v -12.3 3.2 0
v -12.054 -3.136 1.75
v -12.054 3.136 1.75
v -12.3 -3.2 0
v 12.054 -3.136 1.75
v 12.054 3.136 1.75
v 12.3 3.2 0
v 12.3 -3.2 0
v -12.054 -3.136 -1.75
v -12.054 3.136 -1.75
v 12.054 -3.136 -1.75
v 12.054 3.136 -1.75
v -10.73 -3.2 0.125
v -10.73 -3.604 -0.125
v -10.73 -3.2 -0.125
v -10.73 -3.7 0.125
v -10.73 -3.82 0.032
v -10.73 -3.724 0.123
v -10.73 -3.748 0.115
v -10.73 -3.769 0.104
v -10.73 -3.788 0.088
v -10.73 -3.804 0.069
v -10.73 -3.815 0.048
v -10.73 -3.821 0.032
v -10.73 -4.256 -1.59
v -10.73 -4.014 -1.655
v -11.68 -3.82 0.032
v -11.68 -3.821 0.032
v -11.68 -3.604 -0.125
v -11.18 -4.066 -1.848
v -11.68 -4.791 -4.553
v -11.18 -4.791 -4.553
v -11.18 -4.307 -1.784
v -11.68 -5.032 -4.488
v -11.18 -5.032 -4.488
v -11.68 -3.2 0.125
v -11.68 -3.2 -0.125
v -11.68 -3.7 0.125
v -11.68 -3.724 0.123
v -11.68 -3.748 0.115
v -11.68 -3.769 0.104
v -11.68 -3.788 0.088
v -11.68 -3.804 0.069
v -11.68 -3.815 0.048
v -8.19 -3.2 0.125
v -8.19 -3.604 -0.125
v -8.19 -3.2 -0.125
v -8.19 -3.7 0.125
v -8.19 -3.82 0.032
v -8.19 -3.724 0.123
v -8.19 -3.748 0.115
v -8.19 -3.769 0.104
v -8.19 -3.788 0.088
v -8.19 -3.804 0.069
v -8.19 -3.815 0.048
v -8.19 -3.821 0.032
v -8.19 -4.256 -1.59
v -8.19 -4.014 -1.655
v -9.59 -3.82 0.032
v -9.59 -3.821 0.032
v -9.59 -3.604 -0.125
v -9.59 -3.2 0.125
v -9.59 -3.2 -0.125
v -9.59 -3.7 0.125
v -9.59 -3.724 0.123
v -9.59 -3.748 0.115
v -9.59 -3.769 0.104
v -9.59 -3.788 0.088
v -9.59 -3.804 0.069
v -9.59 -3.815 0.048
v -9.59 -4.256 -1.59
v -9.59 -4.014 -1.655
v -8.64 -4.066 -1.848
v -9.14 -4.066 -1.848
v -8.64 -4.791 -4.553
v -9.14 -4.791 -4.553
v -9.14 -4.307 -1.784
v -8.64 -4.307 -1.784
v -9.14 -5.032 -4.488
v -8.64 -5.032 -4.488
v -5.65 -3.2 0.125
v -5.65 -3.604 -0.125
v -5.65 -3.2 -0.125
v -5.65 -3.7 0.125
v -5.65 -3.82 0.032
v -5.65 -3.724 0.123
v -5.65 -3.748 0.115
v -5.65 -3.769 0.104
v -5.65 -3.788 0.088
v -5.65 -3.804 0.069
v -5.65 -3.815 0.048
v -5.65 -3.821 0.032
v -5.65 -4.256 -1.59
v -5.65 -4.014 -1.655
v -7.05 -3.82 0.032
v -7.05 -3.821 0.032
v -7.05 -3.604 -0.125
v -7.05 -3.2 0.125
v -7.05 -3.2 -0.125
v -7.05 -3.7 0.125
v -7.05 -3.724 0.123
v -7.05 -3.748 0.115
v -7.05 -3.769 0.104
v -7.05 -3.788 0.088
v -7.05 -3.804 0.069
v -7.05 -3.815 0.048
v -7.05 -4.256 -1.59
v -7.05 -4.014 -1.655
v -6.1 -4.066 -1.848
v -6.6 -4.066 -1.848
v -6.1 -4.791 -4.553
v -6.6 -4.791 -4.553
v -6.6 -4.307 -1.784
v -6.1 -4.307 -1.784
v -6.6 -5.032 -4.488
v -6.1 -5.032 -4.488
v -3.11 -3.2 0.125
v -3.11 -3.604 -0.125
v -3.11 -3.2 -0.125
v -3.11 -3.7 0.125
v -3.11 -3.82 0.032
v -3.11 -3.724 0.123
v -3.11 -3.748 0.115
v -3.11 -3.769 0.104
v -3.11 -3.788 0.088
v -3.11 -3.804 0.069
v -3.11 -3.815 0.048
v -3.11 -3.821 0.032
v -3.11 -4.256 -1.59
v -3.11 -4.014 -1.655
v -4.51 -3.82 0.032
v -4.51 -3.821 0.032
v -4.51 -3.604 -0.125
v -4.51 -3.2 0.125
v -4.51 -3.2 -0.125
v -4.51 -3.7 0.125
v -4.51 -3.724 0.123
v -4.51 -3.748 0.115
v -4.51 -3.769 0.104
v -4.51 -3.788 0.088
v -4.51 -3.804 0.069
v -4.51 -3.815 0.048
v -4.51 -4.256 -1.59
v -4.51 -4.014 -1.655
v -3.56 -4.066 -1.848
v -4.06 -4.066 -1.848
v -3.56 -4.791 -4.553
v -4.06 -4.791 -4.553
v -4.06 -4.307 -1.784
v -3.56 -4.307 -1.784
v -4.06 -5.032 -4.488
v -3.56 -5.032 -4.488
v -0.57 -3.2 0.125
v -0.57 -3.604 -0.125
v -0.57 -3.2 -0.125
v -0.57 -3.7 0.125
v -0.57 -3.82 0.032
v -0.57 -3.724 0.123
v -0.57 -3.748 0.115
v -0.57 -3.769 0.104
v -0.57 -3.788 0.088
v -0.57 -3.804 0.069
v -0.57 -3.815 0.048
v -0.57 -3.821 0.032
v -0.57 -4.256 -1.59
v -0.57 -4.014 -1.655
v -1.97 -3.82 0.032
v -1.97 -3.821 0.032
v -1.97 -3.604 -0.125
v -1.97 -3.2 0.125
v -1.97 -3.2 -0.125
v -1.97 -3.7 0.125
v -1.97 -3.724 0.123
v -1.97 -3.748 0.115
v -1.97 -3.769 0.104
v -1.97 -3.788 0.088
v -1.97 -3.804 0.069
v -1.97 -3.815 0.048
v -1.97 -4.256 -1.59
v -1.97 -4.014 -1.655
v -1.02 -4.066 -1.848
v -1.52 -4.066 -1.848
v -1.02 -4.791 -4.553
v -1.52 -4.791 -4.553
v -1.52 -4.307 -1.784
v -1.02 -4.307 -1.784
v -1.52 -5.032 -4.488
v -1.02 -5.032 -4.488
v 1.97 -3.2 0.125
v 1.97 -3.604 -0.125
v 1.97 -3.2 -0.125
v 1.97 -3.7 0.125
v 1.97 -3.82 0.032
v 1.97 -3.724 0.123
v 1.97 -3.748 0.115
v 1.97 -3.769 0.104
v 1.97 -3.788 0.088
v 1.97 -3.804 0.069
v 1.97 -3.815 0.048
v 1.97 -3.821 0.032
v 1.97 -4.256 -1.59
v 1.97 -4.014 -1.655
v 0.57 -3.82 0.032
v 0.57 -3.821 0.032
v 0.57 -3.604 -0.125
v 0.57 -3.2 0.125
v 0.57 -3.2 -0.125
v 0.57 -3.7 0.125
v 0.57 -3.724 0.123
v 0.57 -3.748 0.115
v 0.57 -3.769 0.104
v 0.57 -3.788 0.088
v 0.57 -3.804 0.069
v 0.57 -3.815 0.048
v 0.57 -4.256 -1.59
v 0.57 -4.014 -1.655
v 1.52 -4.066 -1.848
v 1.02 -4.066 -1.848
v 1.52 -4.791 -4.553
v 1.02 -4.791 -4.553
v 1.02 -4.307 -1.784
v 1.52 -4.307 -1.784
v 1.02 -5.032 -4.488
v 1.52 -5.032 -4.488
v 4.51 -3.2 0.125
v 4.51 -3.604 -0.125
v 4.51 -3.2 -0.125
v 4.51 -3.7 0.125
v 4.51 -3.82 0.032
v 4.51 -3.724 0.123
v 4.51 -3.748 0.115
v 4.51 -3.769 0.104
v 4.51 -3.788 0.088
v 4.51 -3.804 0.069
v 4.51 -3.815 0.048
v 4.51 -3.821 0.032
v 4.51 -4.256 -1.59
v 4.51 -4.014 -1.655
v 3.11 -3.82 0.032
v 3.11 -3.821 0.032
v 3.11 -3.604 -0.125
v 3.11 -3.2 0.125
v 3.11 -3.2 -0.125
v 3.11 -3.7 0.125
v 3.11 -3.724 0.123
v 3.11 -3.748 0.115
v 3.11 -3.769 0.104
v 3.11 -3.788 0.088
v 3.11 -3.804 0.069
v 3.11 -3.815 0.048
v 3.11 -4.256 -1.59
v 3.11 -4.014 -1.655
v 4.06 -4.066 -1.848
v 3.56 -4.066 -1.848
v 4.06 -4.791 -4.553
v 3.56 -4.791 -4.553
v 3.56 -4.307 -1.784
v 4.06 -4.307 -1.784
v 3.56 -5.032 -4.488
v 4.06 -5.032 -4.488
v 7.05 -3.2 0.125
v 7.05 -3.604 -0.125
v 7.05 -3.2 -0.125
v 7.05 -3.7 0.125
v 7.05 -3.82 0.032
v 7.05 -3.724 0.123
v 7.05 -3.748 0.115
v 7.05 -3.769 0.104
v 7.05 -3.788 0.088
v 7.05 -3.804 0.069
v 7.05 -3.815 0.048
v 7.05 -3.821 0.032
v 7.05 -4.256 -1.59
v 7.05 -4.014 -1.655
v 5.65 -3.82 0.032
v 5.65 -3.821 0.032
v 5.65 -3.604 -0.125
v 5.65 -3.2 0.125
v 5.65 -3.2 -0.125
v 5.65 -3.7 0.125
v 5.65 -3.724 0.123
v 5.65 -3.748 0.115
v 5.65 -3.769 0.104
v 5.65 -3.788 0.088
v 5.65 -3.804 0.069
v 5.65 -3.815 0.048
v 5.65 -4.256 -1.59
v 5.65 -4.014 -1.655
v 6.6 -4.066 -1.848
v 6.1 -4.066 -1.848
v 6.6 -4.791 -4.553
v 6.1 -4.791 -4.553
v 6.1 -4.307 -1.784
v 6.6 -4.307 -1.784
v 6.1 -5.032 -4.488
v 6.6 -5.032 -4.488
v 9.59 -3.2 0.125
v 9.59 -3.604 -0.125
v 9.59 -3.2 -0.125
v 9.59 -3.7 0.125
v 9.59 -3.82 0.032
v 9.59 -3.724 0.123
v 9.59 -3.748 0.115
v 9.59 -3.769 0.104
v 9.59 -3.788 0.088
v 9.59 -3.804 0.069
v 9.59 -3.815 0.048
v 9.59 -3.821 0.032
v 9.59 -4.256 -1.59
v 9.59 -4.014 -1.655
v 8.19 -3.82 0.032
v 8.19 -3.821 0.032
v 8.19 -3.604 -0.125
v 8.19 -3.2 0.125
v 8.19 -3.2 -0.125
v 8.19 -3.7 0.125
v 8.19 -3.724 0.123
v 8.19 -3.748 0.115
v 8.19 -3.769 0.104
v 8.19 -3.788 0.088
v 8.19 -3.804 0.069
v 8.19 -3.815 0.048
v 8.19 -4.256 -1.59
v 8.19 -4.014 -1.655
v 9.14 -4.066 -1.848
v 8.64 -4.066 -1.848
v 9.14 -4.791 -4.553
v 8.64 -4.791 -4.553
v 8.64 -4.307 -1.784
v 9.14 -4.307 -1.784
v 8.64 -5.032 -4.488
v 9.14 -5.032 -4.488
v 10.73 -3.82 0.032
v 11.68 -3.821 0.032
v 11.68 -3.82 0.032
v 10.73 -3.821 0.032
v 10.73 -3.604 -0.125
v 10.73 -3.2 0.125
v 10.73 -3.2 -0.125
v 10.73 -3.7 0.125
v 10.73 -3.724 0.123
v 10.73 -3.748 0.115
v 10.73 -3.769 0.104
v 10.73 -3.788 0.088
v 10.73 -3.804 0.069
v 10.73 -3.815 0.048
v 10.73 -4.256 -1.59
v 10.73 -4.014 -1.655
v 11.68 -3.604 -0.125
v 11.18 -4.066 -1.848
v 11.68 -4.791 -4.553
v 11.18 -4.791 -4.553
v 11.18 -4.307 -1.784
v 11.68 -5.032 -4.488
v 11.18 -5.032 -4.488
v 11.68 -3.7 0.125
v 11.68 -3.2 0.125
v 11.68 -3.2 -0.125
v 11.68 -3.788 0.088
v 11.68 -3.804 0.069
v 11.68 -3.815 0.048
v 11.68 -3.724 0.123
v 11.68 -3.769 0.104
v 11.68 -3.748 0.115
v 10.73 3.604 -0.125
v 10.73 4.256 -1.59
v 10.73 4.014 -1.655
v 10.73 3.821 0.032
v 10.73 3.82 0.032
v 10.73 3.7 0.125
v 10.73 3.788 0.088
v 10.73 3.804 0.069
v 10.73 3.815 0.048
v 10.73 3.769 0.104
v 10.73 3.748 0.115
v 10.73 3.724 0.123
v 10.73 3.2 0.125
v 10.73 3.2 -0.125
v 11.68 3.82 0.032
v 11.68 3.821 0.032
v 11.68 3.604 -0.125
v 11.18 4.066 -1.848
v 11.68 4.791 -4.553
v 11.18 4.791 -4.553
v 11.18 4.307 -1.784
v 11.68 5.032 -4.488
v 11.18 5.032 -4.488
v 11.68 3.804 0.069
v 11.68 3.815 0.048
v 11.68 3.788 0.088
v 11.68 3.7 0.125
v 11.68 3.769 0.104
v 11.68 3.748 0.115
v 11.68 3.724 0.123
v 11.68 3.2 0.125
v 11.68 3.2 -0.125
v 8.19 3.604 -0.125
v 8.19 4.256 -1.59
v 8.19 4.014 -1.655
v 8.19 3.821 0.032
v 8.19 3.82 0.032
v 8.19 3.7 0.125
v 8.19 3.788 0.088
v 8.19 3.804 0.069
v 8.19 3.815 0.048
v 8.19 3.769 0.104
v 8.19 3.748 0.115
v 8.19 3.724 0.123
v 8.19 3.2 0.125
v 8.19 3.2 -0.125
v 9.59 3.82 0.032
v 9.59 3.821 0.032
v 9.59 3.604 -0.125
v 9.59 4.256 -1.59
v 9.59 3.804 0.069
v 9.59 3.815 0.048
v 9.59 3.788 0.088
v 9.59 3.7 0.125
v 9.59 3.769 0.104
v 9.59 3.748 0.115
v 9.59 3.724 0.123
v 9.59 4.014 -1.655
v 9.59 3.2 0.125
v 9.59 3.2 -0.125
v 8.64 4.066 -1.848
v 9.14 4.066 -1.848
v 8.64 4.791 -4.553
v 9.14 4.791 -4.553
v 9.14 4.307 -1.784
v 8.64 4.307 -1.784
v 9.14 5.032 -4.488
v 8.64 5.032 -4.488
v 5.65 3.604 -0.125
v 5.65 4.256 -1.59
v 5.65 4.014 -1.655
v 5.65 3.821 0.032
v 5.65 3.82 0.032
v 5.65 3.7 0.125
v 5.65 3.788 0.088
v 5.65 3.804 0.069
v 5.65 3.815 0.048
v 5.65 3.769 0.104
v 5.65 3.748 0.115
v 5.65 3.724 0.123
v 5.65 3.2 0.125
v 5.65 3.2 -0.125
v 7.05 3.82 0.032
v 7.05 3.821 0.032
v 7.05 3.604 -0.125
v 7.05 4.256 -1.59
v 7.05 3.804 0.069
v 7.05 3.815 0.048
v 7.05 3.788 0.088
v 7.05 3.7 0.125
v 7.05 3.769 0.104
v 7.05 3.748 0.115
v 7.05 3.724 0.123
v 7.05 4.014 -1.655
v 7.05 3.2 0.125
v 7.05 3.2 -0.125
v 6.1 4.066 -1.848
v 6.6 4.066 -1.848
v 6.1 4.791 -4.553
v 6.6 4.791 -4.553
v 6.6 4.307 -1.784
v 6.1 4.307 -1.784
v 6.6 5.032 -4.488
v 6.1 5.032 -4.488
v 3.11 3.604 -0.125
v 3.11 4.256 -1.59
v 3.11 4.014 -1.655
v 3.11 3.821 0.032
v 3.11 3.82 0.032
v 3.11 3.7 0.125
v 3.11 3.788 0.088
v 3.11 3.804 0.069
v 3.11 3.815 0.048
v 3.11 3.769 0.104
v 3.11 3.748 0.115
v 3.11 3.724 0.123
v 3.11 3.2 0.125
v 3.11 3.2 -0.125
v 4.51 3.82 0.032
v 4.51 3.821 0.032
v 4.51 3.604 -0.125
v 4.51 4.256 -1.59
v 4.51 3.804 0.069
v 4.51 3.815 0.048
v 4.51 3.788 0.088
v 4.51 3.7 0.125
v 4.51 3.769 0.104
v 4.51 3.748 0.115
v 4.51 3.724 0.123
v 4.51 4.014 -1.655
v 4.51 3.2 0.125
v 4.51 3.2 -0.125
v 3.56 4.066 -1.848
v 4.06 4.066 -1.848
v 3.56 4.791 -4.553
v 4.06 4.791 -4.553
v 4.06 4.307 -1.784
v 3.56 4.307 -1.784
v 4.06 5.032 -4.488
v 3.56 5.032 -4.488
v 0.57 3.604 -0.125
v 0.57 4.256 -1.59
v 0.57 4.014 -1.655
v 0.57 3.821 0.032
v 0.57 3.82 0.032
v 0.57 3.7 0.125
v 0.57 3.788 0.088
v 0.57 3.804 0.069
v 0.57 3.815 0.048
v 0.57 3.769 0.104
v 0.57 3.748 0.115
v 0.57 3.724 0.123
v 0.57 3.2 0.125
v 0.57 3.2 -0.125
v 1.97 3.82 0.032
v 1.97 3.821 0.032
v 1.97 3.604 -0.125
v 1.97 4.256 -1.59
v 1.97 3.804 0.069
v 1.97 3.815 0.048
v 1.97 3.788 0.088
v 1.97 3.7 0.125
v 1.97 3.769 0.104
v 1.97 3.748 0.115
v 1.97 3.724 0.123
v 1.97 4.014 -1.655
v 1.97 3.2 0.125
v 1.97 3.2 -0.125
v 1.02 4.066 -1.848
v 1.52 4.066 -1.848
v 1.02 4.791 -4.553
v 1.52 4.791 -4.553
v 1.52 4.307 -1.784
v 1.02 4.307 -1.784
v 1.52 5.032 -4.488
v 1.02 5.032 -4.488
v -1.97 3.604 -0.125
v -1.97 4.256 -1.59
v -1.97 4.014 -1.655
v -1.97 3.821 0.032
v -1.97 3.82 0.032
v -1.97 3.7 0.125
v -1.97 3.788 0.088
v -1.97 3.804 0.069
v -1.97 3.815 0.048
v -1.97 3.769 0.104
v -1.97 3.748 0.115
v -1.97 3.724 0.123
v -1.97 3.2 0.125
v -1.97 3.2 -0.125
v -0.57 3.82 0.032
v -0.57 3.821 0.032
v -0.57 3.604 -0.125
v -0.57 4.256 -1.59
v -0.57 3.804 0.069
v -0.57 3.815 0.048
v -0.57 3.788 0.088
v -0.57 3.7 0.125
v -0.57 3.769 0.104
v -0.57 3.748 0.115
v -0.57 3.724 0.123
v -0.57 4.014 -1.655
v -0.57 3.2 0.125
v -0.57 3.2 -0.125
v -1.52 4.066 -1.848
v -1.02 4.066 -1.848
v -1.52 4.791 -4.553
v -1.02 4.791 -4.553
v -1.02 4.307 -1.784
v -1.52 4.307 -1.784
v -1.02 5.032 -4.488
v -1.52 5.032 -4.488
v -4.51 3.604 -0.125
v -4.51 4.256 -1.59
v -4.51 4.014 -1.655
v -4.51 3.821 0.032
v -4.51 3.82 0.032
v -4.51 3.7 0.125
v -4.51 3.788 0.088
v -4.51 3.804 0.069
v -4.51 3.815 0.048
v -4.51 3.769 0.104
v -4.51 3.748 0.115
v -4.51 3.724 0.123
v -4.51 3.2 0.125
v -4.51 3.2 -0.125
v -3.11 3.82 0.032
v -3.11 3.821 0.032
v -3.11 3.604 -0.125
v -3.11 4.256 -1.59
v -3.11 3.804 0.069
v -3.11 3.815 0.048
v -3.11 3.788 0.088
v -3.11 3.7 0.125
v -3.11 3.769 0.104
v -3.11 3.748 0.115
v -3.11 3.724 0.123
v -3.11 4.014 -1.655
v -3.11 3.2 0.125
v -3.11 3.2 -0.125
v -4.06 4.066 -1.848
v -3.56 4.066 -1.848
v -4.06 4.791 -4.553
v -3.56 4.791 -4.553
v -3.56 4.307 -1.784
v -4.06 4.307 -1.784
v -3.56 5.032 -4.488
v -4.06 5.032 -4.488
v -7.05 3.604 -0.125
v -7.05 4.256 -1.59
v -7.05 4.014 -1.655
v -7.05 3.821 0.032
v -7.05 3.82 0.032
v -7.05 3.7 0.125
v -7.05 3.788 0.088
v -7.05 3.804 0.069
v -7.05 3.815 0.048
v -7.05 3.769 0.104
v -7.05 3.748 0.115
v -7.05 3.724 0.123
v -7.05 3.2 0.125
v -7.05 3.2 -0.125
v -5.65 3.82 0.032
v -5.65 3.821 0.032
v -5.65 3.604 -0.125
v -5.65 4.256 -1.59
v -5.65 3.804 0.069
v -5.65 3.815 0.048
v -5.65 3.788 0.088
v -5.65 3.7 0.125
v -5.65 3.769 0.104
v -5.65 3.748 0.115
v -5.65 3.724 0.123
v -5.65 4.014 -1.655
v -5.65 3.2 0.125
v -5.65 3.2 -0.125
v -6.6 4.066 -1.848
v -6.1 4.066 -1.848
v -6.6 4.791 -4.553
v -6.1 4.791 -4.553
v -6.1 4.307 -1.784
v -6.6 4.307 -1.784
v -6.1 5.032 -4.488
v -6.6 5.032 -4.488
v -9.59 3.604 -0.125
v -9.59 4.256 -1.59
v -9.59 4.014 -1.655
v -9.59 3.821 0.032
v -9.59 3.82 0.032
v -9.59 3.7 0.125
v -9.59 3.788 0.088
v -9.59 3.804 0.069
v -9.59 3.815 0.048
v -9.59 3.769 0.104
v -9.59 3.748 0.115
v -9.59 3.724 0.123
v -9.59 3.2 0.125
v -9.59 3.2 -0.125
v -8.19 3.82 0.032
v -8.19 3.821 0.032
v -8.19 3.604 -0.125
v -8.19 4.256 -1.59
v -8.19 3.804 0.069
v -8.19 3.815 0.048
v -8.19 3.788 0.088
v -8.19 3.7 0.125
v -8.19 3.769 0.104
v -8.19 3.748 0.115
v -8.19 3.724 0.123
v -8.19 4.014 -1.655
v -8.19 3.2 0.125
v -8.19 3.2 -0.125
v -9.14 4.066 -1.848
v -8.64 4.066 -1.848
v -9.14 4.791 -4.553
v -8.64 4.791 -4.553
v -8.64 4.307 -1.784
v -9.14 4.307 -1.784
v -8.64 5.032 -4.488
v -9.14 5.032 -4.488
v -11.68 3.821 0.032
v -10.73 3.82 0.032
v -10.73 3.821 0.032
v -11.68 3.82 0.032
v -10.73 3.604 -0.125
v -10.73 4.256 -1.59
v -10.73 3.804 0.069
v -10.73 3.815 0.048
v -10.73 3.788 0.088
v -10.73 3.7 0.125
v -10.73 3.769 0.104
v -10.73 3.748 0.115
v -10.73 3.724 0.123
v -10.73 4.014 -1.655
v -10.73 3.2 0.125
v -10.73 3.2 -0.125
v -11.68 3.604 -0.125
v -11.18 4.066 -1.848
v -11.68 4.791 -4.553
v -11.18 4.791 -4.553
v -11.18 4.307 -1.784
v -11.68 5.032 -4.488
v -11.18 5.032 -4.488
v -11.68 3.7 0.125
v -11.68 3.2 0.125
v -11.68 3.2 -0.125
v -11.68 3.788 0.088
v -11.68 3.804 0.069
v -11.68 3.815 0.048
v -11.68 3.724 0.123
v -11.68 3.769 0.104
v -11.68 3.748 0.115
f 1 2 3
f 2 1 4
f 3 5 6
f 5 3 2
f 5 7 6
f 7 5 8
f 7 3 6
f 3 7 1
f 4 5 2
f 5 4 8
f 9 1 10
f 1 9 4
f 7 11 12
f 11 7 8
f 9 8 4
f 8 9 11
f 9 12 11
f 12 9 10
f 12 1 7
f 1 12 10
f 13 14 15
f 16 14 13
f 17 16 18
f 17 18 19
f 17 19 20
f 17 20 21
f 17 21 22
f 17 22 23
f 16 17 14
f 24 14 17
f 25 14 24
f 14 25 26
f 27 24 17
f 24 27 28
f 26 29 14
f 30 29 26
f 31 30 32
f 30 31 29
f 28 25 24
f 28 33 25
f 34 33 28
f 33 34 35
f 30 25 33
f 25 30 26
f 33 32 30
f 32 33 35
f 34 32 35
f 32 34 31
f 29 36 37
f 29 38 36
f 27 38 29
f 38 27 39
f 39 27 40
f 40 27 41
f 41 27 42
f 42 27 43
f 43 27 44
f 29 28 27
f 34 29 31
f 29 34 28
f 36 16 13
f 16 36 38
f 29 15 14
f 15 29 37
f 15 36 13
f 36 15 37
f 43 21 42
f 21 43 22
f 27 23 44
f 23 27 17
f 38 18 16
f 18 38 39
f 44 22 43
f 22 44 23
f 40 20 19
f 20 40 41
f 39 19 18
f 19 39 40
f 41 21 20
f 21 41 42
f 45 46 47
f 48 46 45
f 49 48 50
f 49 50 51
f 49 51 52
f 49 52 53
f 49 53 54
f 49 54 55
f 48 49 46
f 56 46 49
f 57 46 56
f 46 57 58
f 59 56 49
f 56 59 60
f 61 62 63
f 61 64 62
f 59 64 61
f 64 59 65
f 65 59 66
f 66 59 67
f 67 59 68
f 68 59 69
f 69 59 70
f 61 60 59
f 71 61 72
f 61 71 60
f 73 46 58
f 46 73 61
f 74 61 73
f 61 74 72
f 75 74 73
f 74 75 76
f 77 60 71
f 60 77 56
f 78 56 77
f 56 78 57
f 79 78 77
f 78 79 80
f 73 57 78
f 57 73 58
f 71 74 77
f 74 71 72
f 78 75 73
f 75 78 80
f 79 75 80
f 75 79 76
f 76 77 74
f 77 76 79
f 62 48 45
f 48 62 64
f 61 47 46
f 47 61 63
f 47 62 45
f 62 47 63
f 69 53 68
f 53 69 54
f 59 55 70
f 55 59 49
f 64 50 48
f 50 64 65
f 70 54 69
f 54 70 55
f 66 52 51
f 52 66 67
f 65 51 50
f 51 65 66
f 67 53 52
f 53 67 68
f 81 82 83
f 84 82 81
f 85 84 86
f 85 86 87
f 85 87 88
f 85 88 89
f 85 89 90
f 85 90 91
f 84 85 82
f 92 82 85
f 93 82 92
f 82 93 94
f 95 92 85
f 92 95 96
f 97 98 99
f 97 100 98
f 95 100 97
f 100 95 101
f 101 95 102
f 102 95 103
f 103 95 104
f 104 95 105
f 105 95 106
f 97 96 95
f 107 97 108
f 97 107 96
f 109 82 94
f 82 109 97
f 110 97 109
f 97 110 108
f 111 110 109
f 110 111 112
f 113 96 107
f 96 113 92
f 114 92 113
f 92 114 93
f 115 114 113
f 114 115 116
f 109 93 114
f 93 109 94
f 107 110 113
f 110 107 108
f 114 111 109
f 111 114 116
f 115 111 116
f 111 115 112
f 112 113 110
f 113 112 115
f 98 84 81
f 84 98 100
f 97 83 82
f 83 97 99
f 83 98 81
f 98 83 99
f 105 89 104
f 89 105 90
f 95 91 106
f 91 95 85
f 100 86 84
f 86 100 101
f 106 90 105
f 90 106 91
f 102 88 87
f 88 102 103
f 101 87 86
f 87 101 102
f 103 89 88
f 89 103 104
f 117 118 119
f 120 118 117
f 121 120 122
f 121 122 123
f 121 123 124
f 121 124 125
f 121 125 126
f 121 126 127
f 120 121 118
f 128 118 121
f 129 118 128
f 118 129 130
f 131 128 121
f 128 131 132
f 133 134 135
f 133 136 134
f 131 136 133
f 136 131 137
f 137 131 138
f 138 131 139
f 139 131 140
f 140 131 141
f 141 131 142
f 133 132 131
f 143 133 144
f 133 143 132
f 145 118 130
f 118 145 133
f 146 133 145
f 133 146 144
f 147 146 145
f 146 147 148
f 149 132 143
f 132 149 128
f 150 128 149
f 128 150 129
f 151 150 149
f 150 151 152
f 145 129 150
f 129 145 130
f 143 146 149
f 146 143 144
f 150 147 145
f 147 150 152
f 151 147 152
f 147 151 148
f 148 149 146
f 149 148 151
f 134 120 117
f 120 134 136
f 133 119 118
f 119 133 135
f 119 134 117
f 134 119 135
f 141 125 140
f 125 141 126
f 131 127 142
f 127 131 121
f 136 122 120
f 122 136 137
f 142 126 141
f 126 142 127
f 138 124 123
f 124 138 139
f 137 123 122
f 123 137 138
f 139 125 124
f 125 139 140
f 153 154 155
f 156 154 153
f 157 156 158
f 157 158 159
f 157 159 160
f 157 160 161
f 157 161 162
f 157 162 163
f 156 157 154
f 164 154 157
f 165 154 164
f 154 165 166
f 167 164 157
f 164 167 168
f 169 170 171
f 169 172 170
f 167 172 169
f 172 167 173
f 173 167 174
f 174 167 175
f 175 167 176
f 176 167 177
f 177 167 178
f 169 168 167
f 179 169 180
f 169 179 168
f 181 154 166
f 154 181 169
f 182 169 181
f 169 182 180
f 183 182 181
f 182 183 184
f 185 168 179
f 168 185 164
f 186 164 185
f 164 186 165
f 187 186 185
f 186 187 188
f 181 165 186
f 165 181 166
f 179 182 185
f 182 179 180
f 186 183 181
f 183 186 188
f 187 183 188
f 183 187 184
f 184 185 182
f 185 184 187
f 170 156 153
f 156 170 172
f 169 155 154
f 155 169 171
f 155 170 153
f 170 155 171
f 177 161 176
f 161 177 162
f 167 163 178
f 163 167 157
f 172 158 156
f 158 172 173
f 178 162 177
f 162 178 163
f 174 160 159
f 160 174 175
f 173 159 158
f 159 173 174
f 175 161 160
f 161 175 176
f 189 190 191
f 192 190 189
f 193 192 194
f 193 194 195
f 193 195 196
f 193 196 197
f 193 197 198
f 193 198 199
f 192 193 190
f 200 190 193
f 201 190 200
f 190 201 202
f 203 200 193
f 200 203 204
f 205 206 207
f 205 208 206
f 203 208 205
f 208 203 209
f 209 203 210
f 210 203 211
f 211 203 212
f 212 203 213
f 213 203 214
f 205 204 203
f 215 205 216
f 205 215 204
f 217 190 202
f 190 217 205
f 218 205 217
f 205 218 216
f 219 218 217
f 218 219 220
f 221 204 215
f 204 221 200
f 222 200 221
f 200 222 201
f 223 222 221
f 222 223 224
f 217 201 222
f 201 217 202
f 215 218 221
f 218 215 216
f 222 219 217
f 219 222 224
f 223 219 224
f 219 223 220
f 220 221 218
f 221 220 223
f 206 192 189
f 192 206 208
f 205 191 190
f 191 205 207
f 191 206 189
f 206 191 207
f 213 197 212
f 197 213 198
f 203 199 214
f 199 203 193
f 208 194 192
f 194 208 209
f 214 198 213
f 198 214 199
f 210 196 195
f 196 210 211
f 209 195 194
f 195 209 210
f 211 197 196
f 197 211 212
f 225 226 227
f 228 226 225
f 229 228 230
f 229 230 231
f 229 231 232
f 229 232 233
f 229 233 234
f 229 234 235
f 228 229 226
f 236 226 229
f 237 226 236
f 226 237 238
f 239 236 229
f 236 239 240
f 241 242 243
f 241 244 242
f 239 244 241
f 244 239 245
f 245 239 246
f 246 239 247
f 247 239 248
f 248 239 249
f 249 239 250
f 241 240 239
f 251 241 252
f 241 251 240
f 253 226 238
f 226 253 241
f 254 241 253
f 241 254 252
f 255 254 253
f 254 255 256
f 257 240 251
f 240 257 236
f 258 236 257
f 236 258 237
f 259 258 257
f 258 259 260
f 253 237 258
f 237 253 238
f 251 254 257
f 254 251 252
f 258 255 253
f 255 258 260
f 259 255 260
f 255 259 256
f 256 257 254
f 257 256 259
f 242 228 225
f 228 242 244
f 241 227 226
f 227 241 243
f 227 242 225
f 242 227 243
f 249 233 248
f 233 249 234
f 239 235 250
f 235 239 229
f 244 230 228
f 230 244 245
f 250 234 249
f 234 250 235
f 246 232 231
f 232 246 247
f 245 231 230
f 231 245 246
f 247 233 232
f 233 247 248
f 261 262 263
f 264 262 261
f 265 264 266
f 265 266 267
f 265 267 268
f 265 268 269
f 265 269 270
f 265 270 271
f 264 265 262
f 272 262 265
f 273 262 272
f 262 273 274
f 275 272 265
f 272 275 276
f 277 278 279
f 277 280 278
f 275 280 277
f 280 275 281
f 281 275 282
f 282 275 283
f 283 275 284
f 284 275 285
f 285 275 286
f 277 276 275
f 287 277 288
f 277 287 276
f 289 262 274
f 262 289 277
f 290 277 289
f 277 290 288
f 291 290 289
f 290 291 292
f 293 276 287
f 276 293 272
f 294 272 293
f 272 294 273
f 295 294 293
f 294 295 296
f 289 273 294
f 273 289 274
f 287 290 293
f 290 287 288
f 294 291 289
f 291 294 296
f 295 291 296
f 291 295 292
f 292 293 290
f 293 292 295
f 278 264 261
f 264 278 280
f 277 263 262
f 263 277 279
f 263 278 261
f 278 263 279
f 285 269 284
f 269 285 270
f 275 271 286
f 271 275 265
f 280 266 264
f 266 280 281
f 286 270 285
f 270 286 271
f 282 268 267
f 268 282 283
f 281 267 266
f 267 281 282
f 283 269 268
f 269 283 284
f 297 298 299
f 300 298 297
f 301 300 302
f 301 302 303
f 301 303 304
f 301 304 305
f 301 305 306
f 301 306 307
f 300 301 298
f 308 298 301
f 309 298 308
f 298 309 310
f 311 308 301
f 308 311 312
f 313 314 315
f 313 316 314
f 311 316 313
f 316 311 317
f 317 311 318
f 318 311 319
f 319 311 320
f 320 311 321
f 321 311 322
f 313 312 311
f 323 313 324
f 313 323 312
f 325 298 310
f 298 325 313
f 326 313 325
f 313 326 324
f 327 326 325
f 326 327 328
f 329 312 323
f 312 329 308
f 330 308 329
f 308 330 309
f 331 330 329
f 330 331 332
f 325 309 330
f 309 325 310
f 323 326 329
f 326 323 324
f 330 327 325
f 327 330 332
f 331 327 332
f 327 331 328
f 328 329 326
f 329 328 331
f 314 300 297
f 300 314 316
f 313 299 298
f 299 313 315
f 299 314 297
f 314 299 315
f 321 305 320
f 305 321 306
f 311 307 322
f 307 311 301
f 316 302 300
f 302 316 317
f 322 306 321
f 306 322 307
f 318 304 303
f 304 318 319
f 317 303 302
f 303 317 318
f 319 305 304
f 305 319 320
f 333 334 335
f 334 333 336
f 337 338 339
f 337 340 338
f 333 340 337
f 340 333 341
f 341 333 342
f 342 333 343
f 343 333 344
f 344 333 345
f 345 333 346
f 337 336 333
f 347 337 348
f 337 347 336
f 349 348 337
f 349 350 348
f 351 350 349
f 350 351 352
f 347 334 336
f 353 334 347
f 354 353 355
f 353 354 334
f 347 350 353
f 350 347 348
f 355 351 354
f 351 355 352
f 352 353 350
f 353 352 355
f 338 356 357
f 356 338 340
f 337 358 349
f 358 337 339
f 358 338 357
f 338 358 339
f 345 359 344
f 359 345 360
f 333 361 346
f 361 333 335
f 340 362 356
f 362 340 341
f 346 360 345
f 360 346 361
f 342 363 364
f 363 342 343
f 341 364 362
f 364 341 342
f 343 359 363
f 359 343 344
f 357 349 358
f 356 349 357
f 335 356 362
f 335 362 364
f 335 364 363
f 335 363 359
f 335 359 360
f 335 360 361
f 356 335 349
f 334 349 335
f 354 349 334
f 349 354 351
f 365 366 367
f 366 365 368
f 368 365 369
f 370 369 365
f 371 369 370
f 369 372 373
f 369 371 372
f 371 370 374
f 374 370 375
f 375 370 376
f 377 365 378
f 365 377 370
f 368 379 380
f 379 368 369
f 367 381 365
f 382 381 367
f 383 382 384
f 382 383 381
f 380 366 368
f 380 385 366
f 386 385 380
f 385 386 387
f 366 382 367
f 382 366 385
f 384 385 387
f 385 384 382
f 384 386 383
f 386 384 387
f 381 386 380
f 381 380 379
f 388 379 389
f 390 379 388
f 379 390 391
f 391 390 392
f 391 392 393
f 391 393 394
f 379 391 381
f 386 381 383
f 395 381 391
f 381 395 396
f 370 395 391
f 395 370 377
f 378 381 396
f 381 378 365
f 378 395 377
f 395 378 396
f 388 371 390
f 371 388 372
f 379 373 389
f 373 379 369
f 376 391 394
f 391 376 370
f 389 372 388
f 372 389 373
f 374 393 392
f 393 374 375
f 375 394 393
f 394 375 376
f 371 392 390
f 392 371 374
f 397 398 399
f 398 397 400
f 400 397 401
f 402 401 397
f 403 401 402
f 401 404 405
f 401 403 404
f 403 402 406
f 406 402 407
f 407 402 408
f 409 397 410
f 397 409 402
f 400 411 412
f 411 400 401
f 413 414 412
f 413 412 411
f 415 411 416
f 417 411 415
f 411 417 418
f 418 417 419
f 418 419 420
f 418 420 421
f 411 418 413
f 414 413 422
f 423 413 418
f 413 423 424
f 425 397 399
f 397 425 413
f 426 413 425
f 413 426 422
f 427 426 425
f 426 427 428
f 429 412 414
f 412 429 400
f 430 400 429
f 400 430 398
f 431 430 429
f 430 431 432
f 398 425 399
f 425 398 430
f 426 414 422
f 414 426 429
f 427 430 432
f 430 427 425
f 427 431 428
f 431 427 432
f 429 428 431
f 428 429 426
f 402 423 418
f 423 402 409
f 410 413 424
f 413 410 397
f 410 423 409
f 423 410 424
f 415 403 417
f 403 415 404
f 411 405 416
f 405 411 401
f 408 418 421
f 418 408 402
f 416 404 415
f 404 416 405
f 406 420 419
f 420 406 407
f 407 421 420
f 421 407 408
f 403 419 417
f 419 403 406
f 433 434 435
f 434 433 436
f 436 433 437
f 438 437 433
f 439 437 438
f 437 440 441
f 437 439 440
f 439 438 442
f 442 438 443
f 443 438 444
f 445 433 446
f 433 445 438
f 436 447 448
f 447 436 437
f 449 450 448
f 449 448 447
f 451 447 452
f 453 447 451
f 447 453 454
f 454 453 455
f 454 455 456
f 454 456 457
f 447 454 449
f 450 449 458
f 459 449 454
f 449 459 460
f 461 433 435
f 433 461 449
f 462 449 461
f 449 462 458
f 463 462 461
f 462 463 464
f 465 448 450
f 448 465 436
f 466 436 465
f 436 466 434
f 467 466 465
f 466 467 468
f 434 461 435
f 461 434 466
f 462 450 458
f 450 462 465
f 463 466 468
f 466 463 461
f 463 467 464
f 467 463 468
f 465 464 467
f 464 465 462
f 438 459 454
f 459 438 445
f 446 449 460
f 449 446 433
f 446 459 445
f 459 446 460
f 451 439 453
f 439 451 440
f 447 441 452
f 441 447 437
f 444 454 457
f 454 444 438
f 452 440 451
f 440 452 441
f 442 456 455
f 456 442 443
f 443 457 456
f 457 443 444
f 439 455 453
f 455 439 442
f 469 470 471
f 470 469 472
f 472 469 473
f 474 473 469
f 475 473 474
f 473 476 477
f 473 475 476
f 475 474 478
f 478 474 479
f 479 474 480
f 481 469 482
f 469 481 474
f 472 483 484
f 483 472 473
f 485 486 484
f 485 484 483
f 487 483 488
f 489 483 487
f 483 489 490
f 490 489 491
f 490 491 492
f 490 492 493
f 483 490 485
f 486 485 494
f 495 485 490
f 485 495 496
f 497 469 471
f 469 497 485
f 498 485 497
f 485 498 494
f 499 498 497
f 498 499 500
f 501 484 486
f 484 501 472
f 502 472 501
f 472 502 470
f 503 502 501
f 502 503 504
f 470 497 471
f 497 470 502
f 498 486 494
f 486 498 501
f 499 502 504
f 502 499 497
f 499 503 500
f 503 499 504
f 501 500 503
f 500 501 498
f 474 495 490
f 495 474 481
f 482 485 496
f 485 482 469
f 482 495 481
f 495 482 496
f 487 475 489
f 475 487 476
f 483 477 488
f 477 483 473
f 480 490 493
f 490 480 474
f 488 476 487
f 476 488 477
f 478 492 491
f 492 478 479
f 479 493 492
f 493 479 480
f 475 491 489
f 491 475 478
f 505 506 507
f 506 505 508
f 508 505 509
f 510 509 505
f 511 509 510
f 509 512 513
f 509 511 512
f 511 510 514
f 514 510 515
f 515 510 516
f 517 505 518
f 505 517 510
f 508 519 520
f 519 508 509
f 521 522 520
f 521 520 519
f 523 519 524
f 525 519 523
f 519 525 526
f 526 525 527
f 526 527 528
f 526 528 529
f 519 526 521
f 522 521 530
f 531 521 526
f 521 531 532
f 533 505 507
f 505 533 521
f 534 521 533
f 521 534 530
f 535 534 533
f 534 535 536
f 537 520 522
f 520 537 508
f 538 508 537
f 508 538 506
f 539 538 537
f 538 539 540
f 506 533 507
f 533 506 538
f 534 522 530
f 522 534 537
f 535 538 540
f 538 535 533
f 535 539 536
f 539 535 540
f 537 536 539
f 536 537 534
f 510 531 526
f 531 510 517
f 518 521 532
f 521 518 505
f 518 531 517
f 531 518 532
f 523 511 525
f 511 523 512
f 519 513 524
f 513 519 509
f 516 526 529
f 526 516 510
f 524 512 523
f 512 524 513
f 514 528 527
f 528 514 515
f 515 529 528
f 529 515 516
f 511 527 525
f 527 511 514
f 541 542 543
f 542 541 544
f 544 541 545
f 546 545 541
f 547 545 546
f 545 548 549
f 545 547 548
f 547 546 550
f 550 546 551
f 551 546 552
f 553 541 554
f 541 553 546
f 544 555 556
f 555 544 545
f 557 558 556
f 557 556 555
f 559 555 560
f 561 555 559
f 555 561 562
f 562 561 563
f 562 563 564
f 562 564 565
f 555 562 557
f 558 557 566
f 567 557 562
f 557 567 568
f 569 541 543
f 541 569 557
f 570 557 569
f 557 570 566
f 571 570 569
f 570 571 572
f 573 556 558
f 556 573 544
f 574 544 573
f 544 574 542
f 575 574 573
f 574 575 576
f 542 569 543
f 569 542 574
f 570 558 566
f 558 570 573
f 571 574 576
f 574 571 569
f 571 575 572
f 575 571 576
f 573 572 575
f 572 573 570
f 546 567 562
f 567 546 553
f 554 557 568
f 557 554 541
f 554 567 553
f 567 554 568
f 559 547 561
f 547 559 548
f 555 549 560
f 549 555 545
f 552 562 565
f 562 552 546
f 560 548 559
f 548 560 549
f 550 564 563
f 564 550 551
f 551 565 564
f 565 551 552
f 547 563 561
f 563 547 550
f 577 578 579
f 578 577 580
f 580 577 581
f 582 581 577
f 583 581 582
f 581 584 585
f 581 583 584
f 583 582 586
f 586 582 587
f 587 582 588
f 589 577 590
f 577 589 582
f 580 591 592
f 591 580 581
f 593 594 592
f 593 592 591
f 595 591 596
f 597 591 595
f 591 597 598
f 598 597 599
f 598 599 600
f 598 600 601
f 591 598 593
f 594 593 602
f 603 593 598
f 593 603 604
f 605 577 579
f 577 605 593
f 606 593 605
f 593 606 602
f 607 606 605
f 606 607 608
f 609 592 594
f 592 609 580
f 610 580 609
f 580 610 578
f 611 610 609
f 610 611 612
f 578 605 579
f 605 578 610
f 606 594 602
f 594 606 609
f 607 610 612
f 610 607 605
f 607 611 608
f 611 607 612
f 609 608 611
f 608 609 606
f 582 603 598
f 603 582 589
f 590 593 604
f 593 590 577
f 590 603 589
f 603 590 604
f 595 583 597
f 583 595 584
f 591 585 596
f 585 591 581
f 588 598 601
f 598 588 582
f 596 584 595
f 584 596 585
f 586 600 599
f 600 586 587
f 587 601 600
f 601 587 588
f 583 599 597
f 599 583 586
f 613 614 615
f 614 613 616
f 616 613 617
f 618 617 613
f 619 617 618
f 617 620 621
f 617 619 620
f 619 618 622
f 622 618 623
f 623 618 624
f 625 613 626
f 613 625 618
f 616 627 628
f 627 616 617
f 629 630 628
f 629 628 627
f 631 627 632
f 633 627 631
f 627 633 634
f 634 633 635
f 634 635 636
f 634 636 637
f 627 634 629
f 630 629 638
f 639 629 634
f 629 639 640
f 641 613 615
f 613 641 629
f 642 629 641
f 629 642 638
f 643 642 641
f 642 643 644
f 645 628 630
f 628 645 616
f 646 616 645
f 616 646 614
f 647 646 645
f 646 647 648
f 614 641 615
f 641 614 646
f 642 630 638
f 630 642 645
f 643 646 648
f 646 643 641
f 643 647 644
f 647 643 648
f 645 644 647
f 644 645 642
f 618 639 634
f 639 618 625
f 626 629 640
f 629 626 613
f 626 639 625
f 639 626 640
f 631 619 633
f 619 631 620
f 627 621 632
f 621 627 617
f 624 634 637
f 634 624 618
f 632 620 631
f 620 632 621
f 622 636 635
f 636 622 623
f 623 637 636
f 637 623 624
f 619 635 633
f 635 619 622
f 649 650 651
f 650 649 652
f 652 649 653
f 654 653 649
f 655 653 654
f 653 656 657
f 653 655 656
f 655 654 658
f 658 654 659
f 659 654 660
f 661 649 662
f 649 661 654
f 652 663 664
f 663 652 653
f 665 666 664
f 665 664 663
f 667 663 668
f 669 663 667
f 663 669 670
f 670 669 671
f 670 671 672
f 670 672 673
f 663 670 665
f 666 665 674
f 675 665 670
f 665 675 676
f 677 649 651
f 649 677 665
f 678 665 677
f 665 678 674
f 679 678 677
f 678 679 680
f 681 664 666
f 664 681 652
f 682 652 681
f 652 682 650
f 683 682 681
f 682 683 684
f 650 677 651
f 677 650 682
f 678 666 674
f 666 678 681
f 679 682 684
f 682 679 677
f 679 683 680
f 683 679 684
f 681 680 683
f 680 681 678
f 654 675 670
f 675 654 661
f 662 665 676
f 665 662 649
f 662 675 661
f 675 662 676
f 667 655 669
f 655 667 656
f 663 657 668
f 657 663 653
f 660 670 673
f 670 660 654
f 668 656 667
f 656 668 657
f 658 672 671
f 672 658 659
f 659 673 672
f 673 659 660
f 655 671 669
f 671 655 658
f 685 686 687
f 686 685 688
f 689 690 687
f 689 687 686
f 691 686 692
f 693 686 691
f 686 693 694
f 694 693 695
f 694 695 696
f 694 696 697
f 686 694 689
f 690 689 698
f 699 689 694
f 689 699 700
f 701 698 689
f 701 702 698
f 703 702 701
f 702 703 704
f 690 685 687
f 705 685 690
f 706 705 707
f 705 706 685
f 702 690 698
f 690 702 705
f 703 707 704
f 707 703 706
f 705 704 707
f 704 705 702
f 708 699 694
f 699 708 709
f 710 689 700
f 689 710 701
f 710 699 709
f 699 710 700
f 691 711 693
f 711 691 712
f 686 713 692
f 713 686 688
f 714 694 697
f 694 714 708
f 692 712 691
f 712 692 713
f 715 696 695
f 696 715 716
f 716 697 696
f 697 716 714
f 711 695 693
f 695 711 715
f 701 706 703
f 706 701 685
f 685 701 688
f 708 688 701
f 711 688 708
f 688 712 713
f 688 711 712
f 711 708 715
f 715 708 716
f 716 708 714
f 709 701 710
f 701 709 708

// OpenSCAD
/*

Mostly accurate for 20 pins or less for most IC models.
This tool has cust first and last pin shaving off a bit of the tab,
as that was like the reference I had, not all manf. do this.

The loft angle for the IC package is determined not by the dimenions of the top of the package
but by a const 98% scale burried in the code, this is accurate enough for 8-14 pin
packages to "look good" but creates a lofted angle that is extreme for large packages
like the 64 pin 68000

I also don't cut out a notch or a have a pin 1 identifier, I was happy enough for this..

The license is WTFPL - http://www.wtfpl.net/

PLEASE use this, lol I don't know why I created it... I was just noodling around
it'd be cool if you dropped me a line telling me you used it or passed along some
merges, but not required... have fun.


        DO WHAT THE FUCK YOU WANT TO PUBLIC LICENSE 
                    Version 2, December 2004 

 Copyright (C) 2004 Sam Hocevar <sam@hocevar.net> 

 Everyone is permitted to copy and distribute verbatim or modified 
 copies of this license document, and changing it is allowed as long 
 as the name is changed. 

            DO WHAT THE FUCK YOU WANT TO PUBLIC LICENSE 
   TERMS AND CONDITIONS FOR COPYING, DISTRIBUTION AND MODIFICATION 

  0. You just DO WHAT THE FUCK YOU WANT TO.
*/

module ic() {
  ic_body_thickness = 3.5;
  ic_body_width = 6.4;

  pin_count = 20;
  pin_spacing = 2.54;

  pin_ofs = 0.87;

  leg_angle = 15;

  leg_offset_from_body = 0.5;

  ic_body_length = pin_ofs + pin_ofs + (pin_spacing * (pin_count/2-1));

  // leg thickness
  thickness = 0.25;
  
  // width of portion coming from the body
  upper_width = thickness*5.6;
  // width of through hole pin portion
  lower_width = thickness*2;

  lower_length_top = upper_width * 1.2;  
  lower_length = 3.0;
  
  module ic_body_half() {
    linear_extrude(height=ic_body_thickness/2, scale=0.98) {
      square(size=[ic_body_length, ic_body_width], center=true);
    }
  }

  module ic_body() {
    union() {
      ic_body_half();  // First half
      rotate([180, 0, 0]) ic_body_half();  // Second half flipped and positioned
    }
  }

  module ic_leg() {
    scale_factor = lower_width / upper_width;
    // Base section (Box)
    translate([0, -leg_offset_from_body/2, 0]) {
      cube([upper_width, leg_offset_from_body, thickness], center=true);
    }

    // Cylinder (Bend)
    translate([0, -leg_offset_from_body, 0]) {
      rotate([0, 90, 0]) { // Rotating to align along the Y-axis
        cylinder(h=upper_width, r=thickness/2, center=true, $fn=32);
      }
    }

    translate([0, -leg_offset_from_body, 0])  {
      rotate([-leg_angle,0,0]) {
        translate([0, 0, -lower_length_top/2])  {
          cube([upper_width, thickness, lower_length_top], center=true);
        }

        translate([0, 0, -lower_length_top])  {
          rotate([0,180,0]) {
            linear_extrude(height = .2, scale = [scale_factor, 1]) {
              square([upper_width, thickness], center = true);
            }
          }
        }

        translate([0,0, -lower_length_top-lower_length/2]) {
          cube([lower_width, thickness, lower_length], center= true);
        }
      }
    }
  }

  module leg_array() {
    difference() {
      union() {
        for (i = [0 : pin_count/2-1]) {
          translate([i * pin_spacing, 0, 0])
          ic_leg();
        }
      }
      translate([-upper_width/2-(lower_width/2), -ic_body_width+1, -lower_length-lower_length_top-thickness])
        cube([upper_width/2, ic_body_width, lower_length+lower_length_top+thickness+thickness]);

      translate([(pin_count/2-1)*pin_spacing+lower_width/2, -ic_body_width+1, -lower_length-lower_length_top-thickness])
        cube([upper_width/2, ic_body_width, lower_length+lower_length_top+thickness+thickness]);
    }      
  }

  module legset() {
    x = -ic_body_width/2;
    left_ofs = -((pin_count/4) * pin_spacing) + (pin_spacing/2);
    translate([left_ofs, x, 0]) {  
      leg_array();
    }    
  }
  union() {
    ic_body();
    legset();
    rotate([0,0,180]) legset();
  }
}

ic();
